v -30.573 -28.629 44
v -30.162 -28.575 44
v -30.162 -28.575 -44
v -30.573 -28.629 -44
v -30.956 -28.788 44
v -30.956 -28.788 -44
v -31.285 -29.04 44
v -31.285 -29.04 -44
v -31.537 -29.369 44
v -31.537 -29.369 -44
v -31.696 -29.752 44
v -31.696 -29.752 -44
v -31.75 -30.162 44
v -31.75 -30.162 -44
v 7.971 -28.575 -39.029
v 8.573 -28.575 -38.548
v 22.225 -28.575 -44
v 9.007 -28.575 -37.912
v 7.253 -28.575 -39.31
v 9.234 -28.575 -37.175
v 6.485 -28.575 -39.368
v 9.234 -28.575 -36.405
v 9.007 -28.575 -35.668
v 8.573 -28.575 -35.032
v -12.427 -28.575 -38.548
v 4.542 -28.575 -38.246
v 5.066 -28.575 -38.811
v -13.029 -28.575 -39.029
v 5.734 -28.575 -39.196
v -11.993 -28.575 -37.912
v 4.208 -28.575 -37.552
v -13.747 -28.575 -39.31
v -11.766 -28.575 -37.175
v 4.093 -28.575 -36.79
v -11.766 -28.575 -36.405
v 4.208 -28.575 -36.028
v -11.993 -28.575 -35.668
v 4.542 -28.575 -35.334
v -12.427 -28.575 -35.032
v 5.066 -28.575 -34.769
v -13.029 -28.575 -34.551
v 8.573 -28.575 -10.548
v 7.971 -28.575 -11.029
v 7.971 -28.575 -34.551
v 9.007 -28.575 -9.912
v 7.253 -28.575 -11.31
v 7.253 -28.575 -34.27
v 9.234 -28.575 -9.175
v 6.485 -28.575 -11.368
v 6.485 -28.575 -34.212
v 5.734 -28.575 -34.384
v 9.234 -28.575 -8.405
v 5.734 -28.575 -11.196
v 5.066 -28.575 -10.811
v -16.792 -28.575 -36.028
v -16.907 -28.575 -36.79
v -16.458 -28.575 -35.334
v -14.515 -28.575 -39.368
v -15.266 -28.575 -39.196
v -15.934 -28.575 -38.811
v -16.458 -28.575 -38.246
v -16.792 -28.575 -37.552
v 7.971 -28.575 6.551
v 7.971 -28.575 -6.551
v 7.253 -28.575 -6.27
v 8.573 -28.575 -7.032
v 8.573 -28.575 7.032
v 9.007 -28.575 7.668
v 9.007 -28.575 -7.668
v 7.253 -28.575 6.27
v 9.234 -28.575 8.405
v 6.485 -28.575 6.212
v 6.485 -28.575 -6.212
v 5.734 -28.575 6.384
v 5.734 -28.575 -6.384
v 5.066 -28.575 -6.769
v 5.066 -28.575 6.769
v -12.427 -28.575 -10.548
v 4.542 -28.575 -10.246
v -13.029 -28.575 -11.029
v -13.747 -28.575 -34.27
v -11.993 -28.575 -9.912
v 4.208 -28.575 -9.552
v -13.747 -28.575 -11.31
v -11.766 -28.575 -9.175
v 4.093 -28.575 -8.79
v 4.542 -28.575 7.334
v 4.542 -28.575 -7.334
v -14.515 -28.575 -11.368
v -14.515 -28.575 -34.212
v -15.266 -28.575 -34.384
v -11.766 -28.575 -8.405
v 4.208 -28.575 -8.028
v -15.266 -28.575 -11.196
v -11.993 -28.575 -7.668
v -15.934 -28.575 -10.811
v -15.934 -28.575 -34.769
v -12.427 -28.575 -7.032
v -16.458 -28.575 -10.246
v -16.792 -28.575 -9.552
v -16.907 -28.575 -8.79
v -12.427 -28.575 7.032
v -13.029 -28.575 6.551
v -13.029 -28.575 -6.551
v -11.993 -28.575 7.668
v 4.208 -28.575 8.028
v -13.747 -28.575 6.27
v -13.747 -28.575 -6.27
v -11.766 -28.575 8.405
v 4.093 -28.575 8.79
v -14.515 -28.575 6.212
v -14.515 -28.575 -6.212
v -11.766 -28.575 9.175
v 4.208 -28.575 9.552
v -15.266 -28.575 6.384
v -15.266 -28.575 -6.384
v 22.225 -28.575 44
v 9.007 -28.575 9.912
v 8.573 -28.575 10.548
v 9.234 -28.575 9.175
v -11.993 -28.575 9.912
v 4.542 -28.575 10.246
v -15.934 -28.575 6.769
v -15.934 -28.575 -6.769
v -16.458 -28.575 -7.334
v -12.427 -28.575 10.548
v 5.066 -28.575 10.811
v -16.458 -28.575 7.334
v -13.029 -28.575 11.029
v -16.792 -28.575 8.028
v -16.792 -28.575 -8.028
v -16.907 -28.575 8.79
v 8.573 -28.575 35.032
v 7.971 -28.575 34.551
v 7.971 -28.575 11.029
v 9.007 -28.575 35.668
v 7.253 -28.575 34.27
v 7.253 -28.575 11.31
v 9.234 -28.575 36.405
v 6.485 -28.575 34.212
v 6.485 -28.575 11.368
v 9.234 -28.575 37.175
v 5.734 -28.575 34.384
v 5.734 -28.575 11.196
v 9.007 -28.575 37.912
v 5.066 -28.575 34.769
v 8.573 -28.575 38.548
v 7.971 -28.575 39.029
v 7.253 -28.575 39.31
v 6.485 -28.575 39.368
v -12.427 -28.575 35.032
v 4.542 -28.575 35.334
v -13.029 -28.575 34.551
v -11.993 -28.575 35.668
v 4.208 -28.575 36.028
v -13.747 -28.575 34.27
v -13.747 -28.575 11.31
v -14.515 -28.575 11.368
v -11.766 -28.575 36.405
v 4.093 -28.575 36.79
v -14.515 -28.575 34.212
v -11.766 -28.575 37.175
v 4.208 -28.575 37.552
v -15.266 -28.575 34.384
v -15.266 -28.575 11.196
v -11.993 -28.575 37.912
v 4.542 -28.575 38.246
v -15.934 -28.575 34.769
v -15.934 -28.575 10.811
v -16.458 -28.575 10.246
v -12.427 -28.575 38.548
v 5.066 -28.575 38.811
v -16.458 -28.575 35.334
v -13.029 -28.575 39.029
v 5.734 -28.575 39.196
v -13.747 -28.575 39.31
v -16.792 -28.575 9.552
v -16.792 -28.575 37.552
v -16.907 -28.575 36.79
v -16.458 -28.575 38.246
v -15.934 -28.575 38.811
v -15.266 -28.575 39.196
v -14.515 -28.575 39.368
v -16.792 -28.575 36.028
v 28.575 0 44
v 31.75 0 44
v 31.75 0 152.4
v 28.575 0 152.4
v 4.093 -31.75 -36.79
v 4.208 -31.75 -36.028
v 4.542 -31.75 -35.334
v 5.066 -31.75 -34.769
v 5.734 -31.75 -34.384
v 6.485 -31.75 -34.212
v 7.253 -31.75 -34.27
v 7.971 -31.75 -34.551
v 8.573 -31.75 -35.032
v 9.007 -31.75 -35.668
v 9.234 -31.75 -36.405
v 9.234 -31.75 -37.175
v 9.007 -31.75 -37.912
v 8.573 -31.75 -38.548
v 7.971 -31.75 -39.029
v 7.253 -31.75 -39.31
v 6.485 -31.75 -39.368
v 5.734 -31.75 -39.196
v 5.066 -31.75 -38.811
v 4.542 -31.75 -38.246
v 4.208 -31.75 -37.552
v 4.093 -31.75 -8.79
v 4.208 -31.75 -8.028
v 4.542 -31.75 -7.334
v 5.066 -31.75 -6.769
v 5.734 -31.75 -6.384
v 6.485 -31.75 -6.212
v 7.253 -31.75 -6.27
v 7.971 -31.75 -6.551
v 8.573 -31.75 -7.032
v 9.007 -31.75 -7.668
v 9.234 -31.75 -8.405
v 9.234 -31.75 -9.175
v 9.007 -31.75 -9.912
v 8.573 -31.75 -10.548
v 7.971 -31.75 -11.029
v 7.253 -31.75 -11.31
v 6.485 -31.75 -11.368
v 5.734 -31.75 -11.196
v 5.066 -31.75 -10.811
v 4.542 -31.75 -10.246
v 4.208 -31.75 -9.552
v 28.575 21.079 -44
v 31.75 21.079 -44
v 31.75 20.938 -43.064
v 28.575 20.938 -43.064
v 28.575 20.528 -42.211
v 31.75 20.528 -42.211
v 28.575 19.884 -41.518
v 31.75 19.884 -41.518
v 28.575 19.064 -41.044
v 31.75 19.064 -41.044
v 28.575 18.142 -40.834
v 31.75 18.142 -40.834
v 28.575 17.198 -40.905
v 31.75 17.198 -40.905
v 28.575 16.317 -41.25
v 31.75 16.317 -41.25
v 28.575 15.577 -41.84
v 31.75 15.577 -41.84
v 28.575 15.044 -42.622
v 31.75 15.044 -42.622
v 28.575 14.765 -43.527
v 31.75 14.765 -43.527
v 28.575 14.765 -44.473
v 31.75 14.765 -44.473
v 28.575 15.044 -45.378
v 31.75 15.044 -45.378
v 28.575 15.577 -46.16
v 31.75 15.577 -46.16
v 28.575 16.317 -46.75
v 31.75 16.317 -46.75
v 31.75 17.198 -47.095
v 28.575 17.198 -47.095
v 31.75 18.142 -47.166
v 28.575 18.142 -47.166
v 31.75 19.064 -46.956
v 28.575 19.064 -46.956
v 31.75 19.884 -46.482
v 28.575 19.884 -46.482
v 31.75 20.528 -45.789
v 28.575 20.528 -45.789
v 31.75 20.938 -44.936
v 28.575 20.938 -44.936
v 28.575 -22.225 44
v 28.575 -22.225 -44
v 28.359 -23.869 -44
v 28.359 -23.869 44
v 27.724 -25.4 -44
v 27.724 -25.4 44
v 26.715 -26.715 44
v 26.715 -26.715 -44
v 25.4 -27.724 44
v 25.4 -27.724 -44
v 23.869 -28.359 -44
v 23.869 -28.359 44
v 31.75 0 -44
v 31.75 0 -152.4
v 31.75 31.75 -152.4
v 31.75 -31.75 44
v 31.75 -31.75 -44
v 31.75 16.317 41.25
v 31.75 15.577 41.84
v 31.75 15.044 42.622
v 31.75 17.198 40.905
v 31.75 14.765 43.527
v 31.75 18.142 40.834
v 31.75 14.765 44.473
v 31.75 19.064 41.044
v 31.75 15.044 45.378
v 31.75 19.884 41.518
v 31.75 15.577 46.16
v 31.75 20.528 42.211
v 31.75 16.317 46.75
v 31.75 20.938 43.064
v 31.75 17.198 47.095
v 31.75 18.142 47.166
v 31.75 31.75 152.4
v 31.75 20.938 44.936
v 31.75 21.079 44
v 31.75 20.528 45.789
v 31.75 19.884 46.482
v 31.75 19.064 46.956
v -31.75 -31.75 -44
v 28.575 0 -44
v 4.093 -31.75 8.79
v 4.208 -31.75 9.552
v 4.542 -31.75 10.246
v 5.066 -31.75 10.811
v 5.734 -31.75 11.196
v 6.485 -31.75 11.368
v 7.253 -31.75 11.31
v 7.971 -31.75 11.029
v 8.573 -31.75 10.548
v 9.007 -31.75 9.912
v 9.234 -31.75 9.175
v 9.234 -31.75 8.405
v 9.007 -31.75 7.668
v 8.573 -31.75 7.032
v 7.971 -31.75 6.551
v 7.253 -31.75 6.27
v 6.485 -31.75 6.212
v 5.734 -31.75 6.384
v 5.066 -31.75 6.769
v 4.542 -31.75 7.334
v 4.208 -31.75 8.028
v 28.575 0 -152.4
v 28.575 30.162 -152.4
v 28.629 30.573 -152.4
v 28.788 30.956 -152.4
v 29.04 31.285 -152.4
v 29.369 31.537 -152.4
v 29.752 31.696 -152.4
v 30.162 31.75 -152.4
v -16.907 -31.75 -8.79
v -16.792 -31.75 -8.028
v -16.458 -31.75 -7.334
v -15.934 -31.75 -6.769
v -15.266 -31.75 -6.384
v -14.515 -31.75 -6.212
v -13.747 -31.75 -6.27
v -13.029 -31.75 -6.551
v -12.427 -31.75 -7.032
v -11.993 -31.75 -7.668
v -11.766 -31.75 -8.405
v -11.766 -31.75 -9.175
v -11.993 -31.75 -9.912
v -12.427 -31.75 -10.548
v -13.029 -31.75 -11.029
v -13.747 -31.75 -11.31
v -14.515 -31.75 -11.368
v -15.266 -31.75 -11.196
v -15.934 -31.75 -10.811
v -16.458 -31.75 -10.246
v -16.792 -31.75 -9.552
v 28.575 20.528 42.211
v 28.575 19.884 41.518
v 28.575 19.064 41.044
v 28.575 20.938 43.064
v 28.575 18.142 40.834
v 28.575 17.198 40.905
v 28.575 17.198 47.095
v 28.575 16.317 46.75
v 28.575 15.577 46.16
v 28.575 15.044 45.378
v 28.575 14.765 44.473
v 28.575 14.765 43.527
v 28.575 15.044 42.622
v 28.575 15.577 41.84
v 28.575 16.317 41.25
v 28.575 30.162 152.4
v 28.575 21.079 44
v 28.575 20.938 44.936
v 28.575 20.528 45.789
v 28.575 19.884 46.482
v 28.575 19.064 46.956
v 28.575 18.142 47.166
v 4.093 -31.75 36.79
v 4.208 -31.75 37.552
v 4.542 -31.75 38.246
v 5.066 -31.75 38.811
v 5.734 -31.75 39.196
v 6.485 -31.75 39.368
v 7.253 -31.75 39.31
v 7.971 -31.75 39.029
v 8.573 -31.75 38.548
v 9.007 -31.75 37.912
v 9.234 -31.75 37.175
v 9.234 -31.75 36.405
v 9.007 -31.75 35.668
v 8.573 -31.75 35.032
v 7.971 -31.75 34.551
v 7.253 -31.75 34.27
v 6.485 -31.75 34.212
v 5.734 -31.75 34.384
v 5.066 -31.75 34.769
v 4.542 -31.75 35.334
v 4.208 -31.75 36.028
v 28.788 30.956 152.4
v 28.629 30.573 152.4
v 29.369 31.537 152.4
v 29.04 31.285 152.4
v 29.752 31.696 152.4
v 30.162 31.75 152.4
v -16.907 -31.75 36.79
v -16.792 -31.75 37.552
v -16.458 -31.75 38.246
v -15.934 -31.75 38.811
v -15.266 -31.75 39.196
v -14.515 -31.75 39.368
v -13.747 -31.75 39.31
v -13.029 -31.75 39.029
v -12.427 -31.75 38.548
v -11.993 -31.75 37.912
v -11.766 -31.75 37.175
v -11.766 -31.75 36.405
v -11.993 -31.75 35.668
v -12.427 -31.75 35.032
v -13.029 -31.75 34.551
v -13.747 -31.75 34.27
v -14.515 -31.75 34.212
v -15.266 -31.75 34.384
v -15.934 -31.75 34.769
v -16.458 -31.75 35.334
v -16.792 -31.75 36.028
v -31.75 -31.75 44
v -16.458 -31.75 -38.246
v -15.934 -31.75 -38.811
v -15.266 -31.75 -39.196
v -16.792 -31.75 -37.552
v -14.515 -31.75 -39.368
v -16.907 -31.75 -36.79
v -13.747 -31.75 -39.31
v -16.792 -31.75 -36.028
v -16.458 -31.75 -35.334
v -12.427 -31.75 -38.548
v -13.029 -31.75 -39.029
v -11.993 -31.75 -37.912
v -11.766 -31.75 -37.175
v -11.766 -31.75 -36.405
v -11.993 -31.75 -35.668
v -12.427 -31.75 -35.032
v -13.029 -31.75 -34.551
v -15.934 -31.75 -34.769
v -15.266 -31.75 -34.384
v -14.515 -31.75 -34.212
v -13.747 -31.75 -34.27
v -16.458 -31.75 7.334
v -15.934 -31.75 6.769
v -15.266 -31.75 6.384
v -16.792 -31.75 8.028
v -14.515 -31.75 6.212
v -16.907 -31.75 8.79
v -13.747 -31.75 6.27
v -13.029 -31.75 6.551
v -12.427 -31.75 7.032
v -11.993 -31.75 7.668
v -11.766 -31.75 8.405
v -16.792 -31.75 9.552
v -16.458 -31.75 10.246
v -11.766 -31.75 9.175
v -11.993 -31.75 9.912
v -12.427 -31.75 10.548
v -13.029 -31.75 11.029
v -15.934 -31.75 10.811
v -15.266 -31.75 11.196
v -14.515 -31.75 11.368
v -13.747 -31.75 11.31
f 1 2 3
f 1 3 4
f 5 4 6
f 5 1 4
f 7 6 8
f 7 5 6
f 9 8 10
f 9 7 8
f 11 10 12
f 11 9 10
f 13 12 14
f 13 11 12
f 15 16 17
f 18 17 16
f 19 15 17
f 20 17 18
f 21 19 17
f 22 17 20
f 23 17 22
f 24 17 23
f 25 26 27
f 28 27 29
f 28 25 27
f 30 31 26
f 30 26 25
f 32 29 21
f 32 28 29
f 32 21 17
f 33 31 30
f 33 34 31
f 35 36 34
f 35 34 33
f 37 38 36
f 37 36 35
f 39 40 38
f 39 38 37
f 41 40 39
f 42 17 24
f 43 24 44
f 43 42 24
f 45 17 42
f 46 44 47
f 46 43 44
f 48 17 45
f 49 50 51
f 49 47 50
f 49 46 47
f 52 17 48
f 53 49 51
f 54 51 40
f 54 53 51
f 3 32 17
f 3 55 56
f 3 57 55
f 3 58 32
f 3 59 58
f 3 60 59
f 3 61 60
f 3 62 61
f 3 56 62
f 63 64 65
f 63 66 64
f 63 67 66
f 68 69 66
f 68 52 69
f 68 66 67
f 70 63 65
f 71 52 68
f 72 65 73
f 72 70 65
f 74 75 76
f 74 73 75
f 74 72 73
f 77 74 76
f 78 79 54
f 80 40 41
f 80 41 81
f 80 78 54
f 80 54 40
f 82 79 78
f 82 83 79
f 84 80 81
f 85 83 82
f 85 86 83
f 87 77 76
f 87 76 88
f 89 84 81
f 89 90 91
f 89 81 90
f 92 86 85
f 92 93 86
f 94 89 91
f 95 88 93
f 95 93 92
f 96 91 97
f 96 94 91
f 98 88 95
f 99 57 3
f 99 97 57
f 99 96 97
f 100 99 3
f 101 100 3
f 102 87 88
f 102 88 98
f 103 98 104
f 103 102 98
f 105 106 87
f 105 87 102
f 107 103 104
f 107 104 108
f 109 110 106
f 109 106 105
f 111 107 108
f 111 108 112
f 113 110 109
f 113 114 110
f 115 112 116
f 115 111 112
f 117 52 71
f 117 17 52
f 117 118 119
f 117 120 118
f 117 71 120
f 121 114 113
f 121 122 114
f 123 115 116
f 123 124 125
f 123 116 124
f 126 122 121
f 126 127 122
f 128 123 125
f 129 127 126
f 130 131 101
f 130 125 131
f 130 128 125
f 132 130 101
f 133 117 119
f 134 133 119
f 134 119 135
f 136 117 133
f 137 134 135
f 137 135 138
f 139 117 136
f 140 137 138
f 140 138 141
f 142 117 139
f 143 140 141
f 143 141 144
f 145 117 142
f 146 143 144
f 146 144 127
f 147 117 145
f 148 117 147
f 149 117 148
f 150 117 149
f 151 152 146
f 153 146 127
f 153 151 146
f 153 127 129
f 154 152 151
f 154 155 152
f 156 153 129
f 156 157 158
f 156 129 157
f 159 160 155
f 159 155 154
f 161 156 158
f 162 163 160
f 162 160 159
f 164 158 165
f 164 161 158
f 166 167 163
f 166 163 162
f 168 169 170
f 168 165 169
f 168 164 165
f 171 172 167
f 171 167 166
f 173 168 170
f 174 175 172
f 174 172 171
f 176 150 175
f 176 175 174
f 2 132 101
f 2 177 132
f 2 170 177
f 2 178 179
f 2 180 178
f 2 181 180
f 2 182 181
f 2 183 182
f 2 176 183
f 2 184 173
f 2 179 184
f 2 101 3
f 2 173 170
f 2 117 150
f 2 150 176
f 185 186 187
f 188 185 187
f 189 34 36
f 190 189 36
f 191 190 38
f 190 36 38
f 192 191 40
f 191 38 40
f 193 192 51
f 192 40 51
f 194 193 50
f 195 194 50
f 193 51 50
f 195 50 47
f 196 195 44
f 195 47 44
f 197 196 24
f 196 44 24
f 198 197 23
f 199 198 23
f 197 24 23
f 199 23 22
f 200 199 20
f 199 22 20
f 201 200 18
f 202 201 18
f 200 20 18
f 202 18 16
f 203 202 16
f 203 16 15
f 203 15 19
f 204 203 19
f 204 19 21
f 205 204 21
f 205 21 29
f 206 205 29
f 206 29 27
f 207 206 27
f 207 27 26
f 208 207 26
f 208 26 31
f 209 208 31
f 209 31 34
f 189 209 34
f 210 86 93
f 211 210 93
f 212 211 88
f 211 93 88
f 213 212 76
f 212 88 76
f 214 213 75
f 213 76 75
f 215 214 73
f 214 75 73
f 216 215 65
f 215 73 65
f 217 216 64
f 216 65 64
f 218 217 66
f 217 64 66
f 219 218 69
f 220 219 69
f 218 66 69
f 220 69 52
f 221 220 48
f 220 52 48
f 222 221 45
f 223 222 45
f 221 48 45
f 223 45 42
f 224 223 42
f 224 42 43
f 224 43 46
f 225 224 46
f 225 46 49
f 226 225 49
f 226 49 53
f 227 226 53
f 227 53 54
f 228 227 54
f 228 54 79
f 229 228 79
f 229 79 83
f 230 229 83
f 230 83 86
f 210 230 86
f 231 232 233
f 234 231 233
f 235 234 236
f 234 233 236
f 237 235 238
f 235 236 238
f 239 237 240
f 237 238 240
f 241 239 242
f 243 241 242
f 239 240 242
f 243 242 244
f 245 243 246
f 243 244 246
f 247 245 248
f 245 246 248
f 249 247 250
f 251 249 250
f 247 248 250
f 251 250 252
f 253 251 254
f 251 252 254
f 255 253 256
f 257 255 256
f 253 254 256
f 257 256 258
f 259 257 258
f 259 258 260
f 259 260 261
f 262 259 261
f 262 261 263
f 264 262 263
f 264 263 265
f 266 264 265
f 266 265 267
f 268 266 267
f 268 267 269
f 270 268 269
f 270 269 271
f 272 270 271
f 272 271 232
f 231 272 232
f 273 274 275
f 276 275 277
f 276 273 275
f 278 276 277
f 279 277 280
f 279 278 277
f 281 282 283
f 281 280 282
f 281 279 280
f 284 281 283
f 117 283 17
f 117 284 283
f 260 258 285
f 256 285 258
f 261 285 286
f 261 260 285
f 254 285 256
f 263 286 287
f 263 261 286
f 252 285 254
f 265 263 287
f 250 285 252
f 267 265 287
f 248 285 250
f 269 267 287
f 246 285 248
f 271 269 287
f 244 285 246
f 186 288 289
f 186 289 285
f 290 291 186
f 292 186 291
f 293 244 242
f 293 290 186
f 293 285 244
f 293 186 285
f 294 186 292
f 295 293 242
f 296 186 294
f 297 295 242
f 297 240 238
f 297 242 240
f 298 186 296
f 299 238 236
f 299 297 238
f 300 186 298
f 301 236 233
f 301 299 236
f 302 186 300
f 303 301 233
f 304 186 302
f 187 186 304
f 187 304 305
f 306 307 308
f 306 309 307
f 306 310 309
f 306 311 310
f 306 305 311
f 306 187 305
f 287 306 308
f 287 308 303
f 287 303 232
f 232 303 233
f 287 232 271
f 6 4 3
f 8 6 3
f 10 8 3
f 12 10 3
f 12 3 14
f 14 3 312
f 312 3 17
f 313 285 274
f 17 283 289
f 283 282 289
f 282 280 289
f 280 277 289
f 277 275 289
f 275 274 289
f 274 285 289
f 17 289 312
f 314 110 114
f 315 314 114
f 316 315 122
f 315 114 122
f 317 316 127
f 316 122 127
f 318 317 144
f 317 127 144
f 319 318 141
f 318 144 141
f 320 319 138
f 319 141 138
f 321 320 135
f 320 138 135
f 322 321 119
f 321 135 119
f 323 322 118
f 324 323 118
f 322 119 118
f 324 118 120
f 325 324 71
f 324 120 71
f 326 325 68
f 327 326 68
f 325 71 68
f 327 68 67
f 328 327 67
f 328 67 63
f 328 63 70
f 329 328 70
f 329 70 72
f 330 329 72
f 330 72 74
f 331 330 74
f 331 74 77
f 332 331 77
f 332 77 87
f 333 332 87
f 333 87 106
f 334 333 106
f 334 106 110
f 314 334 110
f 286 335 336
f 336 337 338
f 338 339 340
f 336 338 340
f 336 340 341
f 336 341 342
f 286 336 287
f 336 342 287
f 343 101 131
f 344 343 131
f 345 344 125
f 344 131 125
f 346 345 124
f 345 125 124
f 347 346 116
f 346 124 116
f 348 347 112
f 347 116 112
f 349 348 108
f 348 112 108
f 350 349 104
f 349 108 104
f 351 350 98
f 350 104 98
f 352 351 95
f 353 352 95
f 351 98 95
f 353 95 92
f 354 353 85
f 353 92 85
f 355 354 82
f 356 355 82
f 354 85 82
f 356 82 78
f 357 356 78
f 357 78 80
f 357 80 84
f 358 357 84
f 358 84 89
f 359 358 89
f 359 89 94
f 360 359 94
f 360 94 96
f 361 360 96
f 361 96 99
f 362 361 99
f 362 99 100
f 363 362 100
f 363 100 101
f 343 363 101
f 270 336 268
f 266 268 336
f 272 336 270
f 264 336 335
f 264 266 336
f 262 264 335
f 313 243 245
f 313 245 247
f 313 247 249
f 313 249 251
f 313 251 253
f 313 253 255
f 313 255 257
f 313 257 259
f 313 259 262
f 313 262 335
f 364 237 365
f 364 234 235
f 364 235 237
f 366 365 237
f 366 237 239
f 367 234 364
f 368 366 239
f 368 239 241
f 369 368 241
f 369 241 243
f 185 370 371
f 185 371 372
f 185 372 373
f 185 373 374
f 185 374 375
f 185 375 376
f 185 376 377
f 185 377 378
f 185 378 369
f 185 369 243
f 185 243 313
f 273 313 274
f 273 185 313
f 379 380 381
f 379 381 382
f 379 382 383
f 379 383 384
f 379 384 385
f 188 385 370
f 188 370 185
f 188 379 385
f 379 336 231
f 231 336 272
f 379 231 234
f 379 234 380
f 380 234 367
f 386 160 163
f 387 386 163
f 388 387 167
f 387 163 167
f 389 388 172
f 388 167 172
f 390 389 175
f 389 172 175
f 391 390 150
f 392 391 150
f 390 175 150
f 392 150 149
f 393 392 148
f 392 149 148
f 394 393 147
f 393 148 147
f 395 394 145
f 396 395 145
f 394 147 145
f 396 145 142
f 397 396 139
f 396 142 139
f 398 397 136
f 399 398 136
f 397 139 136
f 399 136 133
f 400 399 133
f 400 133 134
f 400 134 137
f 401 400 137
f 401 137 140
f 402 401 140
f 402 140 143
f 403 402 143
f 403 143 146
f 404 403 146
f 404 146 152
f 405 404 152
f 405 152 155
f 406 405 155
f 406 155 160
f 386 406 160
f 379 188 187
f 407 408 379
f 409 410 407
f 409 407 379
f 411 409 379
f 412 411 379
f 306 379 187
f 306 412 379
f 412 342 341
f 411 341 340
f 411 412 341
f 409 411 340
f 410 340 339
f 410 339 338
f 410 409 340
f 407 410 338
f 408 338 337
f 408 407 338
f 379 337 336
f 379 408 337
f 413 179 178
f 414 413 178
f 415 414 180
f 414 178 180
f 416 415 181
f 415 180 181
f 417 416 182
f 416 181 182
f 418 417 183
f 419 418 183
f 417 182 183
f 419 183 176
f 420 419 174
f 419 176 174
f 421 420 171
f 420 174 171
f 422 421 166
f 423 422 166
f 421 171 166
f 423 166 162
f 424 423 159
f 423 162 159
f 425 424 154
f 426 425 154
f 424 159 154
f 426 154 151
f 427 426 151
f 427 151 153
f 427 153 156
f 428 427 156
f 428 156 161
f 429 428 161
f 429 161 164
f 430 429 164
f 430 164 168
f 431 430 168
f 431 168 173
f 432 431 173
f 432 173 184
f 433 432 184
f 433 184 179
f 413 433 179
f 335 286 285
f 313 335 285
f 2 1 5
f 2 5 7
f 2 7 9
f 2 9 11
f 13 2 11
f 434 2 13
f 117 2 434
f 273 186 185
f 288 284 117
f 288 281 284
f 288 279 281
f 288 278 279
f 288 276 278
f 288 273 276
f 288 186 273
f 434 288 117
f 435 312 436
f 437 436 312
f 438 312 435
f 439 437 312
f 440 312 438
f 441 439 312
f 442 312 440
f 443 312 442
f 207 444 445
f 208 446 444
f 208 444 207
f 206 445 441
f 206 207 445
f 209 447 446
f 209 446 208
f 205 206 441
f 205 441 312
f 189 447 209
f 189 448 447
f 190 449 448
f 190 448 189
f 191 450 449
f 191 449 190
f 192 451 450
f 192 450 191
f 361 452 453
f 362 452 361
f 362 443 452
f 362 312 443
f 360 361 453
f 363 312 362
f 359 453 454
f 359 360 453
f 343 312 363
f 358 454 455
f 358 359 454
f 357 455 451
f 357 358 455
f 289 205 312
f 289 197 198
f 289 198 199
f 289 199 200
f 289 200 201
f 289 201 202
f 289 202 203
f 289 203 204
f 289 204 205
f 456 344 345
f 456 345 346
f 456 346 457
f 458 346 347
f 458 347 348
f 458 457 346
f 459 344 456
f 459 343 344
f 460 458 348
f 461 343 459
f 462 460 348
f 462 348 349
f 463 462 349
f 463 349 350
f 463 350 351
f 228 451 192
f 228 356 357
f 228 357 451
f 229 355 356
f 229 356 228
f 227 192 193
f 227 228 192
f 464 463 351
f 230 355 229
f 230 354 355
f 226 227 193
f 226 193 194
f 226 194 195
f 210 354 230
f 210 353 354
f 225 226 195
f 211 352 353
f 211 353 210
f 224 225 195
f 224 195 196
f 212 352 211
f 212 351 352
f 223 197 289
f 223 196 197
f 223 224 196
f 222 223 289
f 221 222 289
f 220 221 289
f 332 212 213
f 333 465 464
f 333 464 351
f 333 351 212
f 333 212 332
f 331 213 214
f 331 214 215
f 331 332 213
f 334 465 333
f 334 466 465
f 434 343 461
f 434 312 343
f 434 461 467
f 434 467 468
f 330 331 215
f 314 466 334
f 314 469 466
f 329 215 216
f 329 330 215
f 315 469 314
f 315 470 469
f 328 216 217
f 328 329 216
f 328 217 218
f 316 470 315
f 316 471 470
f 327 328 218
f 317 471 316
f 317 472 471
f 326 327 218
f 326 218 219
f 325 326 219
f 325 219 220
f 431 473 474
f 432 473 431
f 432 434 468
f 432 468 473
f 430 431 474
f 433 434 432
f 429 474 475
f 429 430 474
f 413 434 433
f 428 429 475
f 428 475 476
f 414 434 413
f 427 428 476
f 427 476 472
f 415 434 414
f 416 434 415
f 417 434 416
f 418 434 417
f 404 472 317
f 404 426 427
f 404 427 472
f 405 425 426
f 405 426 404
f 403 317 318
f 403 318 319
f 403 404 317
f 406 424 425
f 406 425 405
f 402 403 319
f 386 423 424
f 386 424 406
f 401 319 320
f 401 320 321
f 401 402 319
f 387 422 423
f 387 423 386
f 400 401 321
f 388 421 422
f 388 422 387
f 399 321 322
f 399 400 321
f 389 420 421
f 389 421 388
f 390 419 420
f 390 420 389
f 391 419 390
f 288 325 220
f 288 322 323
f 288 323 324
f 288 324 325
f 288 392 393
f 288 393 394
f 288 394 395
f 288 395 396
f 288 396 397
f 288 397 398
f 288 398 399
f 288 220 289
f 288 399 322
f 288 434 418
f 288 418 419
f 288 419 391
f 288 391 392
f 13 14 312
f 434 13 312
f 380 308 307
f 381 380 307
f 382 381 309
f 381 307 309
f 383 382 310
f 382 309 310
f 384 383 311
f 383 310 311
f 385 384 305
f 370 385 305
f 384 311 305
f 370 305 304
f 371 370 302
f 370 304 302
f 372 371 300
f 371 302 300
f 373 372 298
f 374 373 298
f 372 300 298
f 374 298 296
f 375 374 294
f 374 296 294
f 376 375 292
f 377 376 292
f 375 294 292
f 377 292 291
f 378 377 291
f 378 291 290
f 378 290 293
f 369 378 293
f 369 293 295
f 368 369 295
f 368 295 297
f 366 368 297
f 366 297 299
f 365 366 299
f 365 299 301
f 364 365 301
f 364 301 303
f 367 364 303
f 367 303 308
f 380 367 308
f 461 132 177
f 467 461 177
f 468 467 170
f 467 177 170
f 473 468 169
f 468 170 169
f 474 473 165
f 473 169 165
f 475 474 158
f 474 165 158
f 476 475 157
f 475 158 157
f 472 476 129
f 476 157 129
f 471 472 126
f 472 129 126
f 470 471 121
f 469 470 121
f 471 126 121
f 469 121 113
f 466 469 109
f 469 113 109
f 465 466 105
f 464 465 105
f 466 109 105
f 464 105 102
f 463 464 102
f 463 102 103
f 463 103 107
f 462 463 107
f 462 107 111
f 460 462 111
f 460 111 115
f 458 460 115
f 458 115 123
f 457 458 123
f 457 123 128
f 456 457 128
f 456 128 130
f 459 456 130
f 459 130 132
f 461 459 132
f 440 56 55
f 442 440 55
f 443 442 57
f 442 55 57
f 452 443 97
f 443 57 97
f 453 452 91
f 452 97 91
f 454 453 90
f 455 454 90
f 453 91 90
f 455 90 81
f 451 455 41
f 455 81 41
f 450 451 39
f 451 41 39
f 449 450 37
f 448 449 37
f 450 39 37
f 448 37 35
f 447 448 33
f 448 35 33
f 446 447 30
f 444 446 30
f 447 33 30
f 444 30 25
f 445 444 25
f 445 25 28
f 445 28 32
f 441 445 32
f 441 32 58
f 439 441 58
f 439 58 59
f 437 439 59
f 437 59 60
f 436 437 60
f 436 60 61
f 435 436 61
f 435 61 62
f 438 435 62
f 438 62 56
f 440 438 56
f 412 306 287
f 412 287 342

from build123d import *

# Parameters (mm, degrees)
BOSS_EXTRUDE1_DEPTH = 152.4
SKETCH3_R           = 2.585
CUT_EXTRUDE1_DEPTH  = 167.951873679
CUT_EXTRUDE2_DEPTH  = 169.125169145
SKETCH5_R           = 3.175
CUT_EXTRUDE3_DEPTH  = 169.125169145


with BuildPart() as part:
    # Sketch2 → Boss-Extrude1 (new, symmetric)
    with BuildSketch(Plane.XY):
        with BuildLine():
            Line((-31.75, -31.75), (31.75, -31.75))
            Line((31.75, -31.75), (31.75, 31.75))
            Line((31.75, 31.75), (30.1625, 31.75))
            ThreePointArc((30.1625, 31.75), (29.039967985, 31.285032015), (28.575, 30.1625))
            Line((28.575, 30.1625), (28.575, -22.225))
            ThreePointArc((28.575, -22.225), (26.715128061, -26.715128061), (22.225, -28.575))
            Line((22.225, -28.575), (-30.1625, -28.575))
            ThreePointArc((-30.1625, -28.575), (-31.285032015, -29.039967985), (-31.75, -30.1625))
            Line((-31.75, -30.1625), (-31.75, -31.75))
        make_face()
    extrude(amount=BOSS_EXTRUDE1_DEPTH, both=True)

    # Sketch3 → Cut-Extrude1 (cut, through all)
    with BuildSketch(Plane(origin=(0, -28.575, 0), x_dir=(1, 0, 0), z_dir=(0, 1, 0))):
        with Locations(Location((-14.321922022, 8.79, 0), (0, 0, 180))):
            Circle(SKETCH3_R)
        with Locations(Location((6.678077978, 8.79, 0), (0, 0, 180))):
            Circle(SKETCH3_R)
        with Locations(Location((-14.321922022, 36.79, 0), (0, 0, 180))):
            Circle(SKETCH3_R)
        with Locations(Location((6.678077978, 36.79, 0), (0, 0, 180))):
            Circle(SKETCH3_R)
        with Locations(Location((-14.321922022, -36.79, 0), (0, 0, 180))):
            Circle(SKETCH3_R)
        with Locations(Location((6.678077978, -36.79, 0), (0, 0, 180))):
            Circle(SKETCH3_R)
        with Locations(Location((6.678077978, -8.79, 0), (0, 0, 180))):
            Circle(SKETCH3_R)
        with Locations(Location((-14.321922022, -8.79, 0), (0, 0, 180))):
            Circle(SKETCH3_R)
    extrude(amount=-CUT_EXTRUDE1_DEPTH, mode=Mode.SUBTRACT)

    # Sketch4 → Cut-Extrude2 (cut, through all)
    with BuildSketch(Plane(origin=(31.75, 0, 0), x_dir=(0, 0, -1), z_dir=(1, 0, 0))):
        Polygon((-152.4, 0), (-44, 0), (-44, -48.044655534), (-168.625421563, -48.044655534), (-168.625421563, 0), align=None)
        Polygon((168.625421563, -48.044655534), (168.625421563, 0), (152.4, 0), (44, 0), (44, -48.044655534), align=None)
    extrude(amount=-CUT_EXTRUDE2_DEPTH, mode=Mode.SUBTRACT)

    # Sketch5 → Cut-Extrude3 (cut, through all)
    with BuildSketch(Plane(origin=(31.75, 0, 0), x_dir=(0, 0, -1), z_dir=(1, 0, 0))):
        with Locations(Location((-44, 17.904243602, 0), (0, 0, 90))):
            Circle(SKETCH5_R)
        with Locations(Location((44, 17.904243602, 0), (0, 0, 90))):
            Circle(SKETCH5_R)
    extrude(amount=-CUT_EXTRUDE3_DEPTH, mode=Mode.SUBTRACT)


solid = part.part
